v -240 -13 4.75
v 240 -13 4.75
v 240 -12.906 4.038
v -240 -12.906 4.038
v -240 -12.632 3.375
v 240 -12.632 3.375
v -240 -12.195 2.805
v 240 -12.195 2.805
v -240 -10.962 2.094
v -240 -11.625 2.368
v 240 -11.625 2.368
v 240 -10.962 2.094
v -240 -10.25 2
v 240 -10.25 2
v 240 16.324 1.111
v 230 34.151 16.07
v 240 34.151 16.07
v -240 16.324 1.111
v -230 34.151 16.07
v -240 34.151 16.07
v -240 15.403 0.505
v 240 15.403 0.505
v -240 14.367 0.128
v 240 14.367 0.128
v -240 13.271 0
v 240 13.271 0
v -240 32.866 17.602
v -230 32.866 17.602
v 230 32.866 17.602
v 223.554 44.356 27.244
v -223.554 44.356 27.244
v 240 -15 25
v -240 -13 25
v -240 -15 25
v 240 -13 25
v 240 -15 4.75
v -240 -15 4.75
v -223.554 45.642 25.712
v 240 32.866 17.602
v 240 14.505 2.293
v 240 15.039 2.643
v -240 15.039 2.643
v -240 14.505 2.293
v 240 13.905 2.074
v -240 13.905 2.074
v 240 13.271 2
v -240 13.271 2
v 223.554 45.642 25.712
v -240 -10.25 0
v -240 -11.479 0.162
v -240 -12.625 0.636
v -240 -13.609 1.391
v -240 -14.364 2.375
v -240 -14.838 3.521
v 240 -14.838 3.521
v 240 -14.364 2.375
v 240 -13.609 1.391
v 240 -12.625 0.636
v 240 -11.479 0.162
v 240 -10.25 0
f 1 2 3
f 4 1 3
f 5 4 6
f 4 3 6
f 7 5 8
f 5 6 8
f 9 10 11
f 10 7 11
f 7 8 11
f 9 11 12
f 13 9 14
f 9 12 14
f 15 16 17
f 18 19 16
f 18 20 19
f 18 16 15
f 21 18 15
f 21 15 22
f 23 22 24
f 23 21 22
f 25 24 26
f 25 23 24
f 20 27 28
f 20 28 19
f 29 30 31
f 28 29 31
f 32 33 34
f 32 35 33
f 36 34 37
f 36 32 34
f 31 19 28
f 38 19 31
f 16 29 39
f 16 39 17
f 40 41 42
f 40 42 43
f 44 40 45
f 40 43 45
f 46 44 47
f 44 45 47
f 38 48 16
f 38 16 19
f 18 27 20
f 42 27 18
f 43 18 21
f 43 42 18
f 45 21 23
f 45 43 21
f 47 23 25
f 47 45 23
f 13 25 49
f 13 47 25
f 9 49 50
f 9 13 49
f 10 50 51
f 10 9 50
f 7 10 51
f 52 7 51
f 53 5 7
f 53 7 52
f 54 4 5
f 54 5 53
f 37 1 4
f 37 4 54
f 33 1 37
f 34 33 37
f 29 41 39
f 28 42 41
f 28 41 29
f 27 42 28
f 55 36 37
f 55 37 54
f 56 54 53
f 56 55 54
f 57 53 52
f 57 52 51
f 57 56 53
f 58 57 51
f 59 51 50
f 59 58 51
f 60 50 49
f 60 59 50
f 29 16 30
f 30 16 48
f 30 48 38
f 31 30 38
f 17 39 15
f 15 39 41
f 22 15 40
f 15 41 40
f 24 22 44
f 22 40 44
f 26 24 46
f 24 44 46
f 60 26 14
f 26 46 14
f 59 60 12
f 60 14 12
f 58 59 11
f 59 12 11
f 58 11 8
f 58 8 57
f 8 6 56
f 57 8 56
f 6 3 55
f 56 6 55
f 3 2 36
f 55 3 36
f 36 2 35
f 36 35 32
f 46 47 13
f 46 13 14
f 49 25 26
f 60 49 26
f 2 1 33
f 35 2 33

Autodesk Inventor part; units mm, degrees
ref_plane "YZ Plane" through (0, 0, 0) normal (1, 0, 0) x (0, 1, 0)
ref_plane "XZ Plane" through (0, 0, 0) normal (0, 1, 0) x (-1, 0, 0)
ref_plane "XY Plane" through (0, 0, 0) normal (0, 0, 1) x (1, 0, 0)
sketch "Sketch5" plane through (240, 34.1511, 16.0697) normal (0, 0.6427876, -0.7660444) x (-1, 0, 0)
  line L0 (0, 0) -> (480, 0)
  line L1 (0, 0) -> (480, 0)
  line L2 (470, 0) -> (463.5542, 15)
  line L3 (470, 0) -> (480, -23.2711)
  line L4 (0, -23.2711) -> (480, -23.2711)
  line L5 (0, -23.2711) -> (10, 0)
  line L6 (10, 0) -> (16.4458, 15)
  line L7 (16.4458, 15) -> (463.5542, 15)
  line L8 (240, -23.2711) -> (240, 0) construction
  point P0 (240, -36.4907)
  point P1 (10, 0)
  point P2 (470, 0)
  dimension "d32" = 10
  dimension "d33" = 15
sketch "Sketch1" plane through (0, 0, 0) normal (0, 0, 1) x (1, 0, 0)
  line L0 (-240, -15) -> (240, -15)
  line L1 (240, -15) -> (240, 15)
  line L2 (240, 15) -> (-240, 15)
  line L3 (-240, 15) -> (-240, -15)
  line L4 (-240, -15) -> (240, 15) construction
  line L5 (240, -15) -> (-240, 15) construction
  point P0 (0, 0)
  dimension "d0" = 480
  dimension "d1" = 30
extrude "Plate1" add sketch "Sketch1" along normal blind 2
sketch "Sketch2" plane through (0, 0, 0) normal (0, 0, -1) x (-1, 0, 0)
  line L0 (-220, 5) -> (-20, 5) construction
  line L1 (-20, 5) -> (-20, -15) construction
  line L2 (-20, -15) -> (-220, -15) construction
  line L3 (-220, -15) -> (-220, 5) construction
  line L4 (-240, 15) -> (240, 15) projected
  line L5 (-240, -15) -> (-240, 15) projected
  point P0 (0, 0)
  dimension "d6" = 200
  dimension "d9" = 20
  dimension "d10" = 10
  dimension "d11" = 20
mark "Mark1"
sketch "Sketch3" plane through (240, -13, 0) normal (0, -1, 0) x (1, 0, 0)
  line L0 (-480, 0) -> (0, 0)
  line L1 (0, 0) -> (0, 25)
  line L2 (0, 25) -> (-480, 25)
  line L3 (-480, 25) -> (-480, 0)
edge flange "Flange1" height 25 angle 90 thickness 2 bend radius 2.75 thickness toward (0, -1, 0) relief round relief width 2 relief depth 1 edges at (0, -15, 2) wall of the first edge with corners at (-240, -13, 0) (240, -13, 0) (240, -13, 25) (-240, -13, 25)
bend "Bend1"
corner "Corner1"
sketch "Sketch4" plane through (-240, 13.7144, 1.5321) normal (0, 0.6427876, -0.7660444) x (-1, 0, 0)
  line L0 (-480, 0) -> (0, 0)
  line L1 (0, 0) -> (0, 25)
  line L2 (0, 25) -> (-480, 25)
  line L3 (-480, 25) -> (-480, 0)
edge flange "Flange2" height 25 angle 40 thickness 2 bend radius 2.75 thickness toward (0, 0.6427876, -0.7660444) relief round relief width 2 relief depth 1 edges at (0, 15, 2) wall of the first edge with corners at (240, 13.7144, 1.5321) (-240, 13.7144, 1.5321) (-240, 32.8655, 17.6018) (240, 32.8655, 17.6018)
bend "Bend2"
corner "Corner2"
sheet face with bend "Face2" sketch "Sketch5" thickness 2 toward (0, -0.6427876, 0.7660444) bend radius 2.75 contours L6 L7 L2 L0
bend "Bend3"
equation "\"d2\" = Thickness"
equation "\"d12\" = BendReliefWidth"
equation "\"d13\" = BendReliefDepth"
equation "\"d14\" = MinimumRemnant"
equation "\"d15\" = TransitionRadius"
equation "\"d18\" = BendRadius"
equation "\"d19\" = CornerReliefSize"
equation "\"d20\" = GapSize"
equation "\"d21\" = JacobiRadiusSize"
equation "\"d22\" = BendReliefWidth"
equation "\"d23\" = BendReliefDepth"
equation "\"d24\" = MinimumRemnant"
equation "\"d25\" = TransitionRadius"
equation "\"d28\" = BendRadius"
equation "\"d29\" = CornerReliefSize"
equation "\"d30\" = GapSize"
equation "\"d31\" = JacobiRadiusSize"
equation "\"d34\" = BendRadius"
equation "\"d37\" = MinimumRemnant"
equation "\"d35\" = BendReliefWidth"
equation "\"d36\" = BendReliefDepth"
equation "\"d38\" = TransitionRadius"
equation "\"BendReliefWidth\" = Thickness"
equation "\"BendReliefDepth\" = 0.5 * Thickness"
equation "\"CornerReliefSize\" = 4 * Thickness"
equation "\"MinimumRemnant\" = 2 * Thickness"
equation "\"TransitionRadius\" = BendRadius"
equation "\"JacobiRadiusSize\" = BendRadius"
equation "\"GapSize\" = Thickness"
equation "\"Thickness\" = 2"
equation "\"BendRadius\" = 2.75"
properties part number "TRM 024 top damper" material "AISI 304"
